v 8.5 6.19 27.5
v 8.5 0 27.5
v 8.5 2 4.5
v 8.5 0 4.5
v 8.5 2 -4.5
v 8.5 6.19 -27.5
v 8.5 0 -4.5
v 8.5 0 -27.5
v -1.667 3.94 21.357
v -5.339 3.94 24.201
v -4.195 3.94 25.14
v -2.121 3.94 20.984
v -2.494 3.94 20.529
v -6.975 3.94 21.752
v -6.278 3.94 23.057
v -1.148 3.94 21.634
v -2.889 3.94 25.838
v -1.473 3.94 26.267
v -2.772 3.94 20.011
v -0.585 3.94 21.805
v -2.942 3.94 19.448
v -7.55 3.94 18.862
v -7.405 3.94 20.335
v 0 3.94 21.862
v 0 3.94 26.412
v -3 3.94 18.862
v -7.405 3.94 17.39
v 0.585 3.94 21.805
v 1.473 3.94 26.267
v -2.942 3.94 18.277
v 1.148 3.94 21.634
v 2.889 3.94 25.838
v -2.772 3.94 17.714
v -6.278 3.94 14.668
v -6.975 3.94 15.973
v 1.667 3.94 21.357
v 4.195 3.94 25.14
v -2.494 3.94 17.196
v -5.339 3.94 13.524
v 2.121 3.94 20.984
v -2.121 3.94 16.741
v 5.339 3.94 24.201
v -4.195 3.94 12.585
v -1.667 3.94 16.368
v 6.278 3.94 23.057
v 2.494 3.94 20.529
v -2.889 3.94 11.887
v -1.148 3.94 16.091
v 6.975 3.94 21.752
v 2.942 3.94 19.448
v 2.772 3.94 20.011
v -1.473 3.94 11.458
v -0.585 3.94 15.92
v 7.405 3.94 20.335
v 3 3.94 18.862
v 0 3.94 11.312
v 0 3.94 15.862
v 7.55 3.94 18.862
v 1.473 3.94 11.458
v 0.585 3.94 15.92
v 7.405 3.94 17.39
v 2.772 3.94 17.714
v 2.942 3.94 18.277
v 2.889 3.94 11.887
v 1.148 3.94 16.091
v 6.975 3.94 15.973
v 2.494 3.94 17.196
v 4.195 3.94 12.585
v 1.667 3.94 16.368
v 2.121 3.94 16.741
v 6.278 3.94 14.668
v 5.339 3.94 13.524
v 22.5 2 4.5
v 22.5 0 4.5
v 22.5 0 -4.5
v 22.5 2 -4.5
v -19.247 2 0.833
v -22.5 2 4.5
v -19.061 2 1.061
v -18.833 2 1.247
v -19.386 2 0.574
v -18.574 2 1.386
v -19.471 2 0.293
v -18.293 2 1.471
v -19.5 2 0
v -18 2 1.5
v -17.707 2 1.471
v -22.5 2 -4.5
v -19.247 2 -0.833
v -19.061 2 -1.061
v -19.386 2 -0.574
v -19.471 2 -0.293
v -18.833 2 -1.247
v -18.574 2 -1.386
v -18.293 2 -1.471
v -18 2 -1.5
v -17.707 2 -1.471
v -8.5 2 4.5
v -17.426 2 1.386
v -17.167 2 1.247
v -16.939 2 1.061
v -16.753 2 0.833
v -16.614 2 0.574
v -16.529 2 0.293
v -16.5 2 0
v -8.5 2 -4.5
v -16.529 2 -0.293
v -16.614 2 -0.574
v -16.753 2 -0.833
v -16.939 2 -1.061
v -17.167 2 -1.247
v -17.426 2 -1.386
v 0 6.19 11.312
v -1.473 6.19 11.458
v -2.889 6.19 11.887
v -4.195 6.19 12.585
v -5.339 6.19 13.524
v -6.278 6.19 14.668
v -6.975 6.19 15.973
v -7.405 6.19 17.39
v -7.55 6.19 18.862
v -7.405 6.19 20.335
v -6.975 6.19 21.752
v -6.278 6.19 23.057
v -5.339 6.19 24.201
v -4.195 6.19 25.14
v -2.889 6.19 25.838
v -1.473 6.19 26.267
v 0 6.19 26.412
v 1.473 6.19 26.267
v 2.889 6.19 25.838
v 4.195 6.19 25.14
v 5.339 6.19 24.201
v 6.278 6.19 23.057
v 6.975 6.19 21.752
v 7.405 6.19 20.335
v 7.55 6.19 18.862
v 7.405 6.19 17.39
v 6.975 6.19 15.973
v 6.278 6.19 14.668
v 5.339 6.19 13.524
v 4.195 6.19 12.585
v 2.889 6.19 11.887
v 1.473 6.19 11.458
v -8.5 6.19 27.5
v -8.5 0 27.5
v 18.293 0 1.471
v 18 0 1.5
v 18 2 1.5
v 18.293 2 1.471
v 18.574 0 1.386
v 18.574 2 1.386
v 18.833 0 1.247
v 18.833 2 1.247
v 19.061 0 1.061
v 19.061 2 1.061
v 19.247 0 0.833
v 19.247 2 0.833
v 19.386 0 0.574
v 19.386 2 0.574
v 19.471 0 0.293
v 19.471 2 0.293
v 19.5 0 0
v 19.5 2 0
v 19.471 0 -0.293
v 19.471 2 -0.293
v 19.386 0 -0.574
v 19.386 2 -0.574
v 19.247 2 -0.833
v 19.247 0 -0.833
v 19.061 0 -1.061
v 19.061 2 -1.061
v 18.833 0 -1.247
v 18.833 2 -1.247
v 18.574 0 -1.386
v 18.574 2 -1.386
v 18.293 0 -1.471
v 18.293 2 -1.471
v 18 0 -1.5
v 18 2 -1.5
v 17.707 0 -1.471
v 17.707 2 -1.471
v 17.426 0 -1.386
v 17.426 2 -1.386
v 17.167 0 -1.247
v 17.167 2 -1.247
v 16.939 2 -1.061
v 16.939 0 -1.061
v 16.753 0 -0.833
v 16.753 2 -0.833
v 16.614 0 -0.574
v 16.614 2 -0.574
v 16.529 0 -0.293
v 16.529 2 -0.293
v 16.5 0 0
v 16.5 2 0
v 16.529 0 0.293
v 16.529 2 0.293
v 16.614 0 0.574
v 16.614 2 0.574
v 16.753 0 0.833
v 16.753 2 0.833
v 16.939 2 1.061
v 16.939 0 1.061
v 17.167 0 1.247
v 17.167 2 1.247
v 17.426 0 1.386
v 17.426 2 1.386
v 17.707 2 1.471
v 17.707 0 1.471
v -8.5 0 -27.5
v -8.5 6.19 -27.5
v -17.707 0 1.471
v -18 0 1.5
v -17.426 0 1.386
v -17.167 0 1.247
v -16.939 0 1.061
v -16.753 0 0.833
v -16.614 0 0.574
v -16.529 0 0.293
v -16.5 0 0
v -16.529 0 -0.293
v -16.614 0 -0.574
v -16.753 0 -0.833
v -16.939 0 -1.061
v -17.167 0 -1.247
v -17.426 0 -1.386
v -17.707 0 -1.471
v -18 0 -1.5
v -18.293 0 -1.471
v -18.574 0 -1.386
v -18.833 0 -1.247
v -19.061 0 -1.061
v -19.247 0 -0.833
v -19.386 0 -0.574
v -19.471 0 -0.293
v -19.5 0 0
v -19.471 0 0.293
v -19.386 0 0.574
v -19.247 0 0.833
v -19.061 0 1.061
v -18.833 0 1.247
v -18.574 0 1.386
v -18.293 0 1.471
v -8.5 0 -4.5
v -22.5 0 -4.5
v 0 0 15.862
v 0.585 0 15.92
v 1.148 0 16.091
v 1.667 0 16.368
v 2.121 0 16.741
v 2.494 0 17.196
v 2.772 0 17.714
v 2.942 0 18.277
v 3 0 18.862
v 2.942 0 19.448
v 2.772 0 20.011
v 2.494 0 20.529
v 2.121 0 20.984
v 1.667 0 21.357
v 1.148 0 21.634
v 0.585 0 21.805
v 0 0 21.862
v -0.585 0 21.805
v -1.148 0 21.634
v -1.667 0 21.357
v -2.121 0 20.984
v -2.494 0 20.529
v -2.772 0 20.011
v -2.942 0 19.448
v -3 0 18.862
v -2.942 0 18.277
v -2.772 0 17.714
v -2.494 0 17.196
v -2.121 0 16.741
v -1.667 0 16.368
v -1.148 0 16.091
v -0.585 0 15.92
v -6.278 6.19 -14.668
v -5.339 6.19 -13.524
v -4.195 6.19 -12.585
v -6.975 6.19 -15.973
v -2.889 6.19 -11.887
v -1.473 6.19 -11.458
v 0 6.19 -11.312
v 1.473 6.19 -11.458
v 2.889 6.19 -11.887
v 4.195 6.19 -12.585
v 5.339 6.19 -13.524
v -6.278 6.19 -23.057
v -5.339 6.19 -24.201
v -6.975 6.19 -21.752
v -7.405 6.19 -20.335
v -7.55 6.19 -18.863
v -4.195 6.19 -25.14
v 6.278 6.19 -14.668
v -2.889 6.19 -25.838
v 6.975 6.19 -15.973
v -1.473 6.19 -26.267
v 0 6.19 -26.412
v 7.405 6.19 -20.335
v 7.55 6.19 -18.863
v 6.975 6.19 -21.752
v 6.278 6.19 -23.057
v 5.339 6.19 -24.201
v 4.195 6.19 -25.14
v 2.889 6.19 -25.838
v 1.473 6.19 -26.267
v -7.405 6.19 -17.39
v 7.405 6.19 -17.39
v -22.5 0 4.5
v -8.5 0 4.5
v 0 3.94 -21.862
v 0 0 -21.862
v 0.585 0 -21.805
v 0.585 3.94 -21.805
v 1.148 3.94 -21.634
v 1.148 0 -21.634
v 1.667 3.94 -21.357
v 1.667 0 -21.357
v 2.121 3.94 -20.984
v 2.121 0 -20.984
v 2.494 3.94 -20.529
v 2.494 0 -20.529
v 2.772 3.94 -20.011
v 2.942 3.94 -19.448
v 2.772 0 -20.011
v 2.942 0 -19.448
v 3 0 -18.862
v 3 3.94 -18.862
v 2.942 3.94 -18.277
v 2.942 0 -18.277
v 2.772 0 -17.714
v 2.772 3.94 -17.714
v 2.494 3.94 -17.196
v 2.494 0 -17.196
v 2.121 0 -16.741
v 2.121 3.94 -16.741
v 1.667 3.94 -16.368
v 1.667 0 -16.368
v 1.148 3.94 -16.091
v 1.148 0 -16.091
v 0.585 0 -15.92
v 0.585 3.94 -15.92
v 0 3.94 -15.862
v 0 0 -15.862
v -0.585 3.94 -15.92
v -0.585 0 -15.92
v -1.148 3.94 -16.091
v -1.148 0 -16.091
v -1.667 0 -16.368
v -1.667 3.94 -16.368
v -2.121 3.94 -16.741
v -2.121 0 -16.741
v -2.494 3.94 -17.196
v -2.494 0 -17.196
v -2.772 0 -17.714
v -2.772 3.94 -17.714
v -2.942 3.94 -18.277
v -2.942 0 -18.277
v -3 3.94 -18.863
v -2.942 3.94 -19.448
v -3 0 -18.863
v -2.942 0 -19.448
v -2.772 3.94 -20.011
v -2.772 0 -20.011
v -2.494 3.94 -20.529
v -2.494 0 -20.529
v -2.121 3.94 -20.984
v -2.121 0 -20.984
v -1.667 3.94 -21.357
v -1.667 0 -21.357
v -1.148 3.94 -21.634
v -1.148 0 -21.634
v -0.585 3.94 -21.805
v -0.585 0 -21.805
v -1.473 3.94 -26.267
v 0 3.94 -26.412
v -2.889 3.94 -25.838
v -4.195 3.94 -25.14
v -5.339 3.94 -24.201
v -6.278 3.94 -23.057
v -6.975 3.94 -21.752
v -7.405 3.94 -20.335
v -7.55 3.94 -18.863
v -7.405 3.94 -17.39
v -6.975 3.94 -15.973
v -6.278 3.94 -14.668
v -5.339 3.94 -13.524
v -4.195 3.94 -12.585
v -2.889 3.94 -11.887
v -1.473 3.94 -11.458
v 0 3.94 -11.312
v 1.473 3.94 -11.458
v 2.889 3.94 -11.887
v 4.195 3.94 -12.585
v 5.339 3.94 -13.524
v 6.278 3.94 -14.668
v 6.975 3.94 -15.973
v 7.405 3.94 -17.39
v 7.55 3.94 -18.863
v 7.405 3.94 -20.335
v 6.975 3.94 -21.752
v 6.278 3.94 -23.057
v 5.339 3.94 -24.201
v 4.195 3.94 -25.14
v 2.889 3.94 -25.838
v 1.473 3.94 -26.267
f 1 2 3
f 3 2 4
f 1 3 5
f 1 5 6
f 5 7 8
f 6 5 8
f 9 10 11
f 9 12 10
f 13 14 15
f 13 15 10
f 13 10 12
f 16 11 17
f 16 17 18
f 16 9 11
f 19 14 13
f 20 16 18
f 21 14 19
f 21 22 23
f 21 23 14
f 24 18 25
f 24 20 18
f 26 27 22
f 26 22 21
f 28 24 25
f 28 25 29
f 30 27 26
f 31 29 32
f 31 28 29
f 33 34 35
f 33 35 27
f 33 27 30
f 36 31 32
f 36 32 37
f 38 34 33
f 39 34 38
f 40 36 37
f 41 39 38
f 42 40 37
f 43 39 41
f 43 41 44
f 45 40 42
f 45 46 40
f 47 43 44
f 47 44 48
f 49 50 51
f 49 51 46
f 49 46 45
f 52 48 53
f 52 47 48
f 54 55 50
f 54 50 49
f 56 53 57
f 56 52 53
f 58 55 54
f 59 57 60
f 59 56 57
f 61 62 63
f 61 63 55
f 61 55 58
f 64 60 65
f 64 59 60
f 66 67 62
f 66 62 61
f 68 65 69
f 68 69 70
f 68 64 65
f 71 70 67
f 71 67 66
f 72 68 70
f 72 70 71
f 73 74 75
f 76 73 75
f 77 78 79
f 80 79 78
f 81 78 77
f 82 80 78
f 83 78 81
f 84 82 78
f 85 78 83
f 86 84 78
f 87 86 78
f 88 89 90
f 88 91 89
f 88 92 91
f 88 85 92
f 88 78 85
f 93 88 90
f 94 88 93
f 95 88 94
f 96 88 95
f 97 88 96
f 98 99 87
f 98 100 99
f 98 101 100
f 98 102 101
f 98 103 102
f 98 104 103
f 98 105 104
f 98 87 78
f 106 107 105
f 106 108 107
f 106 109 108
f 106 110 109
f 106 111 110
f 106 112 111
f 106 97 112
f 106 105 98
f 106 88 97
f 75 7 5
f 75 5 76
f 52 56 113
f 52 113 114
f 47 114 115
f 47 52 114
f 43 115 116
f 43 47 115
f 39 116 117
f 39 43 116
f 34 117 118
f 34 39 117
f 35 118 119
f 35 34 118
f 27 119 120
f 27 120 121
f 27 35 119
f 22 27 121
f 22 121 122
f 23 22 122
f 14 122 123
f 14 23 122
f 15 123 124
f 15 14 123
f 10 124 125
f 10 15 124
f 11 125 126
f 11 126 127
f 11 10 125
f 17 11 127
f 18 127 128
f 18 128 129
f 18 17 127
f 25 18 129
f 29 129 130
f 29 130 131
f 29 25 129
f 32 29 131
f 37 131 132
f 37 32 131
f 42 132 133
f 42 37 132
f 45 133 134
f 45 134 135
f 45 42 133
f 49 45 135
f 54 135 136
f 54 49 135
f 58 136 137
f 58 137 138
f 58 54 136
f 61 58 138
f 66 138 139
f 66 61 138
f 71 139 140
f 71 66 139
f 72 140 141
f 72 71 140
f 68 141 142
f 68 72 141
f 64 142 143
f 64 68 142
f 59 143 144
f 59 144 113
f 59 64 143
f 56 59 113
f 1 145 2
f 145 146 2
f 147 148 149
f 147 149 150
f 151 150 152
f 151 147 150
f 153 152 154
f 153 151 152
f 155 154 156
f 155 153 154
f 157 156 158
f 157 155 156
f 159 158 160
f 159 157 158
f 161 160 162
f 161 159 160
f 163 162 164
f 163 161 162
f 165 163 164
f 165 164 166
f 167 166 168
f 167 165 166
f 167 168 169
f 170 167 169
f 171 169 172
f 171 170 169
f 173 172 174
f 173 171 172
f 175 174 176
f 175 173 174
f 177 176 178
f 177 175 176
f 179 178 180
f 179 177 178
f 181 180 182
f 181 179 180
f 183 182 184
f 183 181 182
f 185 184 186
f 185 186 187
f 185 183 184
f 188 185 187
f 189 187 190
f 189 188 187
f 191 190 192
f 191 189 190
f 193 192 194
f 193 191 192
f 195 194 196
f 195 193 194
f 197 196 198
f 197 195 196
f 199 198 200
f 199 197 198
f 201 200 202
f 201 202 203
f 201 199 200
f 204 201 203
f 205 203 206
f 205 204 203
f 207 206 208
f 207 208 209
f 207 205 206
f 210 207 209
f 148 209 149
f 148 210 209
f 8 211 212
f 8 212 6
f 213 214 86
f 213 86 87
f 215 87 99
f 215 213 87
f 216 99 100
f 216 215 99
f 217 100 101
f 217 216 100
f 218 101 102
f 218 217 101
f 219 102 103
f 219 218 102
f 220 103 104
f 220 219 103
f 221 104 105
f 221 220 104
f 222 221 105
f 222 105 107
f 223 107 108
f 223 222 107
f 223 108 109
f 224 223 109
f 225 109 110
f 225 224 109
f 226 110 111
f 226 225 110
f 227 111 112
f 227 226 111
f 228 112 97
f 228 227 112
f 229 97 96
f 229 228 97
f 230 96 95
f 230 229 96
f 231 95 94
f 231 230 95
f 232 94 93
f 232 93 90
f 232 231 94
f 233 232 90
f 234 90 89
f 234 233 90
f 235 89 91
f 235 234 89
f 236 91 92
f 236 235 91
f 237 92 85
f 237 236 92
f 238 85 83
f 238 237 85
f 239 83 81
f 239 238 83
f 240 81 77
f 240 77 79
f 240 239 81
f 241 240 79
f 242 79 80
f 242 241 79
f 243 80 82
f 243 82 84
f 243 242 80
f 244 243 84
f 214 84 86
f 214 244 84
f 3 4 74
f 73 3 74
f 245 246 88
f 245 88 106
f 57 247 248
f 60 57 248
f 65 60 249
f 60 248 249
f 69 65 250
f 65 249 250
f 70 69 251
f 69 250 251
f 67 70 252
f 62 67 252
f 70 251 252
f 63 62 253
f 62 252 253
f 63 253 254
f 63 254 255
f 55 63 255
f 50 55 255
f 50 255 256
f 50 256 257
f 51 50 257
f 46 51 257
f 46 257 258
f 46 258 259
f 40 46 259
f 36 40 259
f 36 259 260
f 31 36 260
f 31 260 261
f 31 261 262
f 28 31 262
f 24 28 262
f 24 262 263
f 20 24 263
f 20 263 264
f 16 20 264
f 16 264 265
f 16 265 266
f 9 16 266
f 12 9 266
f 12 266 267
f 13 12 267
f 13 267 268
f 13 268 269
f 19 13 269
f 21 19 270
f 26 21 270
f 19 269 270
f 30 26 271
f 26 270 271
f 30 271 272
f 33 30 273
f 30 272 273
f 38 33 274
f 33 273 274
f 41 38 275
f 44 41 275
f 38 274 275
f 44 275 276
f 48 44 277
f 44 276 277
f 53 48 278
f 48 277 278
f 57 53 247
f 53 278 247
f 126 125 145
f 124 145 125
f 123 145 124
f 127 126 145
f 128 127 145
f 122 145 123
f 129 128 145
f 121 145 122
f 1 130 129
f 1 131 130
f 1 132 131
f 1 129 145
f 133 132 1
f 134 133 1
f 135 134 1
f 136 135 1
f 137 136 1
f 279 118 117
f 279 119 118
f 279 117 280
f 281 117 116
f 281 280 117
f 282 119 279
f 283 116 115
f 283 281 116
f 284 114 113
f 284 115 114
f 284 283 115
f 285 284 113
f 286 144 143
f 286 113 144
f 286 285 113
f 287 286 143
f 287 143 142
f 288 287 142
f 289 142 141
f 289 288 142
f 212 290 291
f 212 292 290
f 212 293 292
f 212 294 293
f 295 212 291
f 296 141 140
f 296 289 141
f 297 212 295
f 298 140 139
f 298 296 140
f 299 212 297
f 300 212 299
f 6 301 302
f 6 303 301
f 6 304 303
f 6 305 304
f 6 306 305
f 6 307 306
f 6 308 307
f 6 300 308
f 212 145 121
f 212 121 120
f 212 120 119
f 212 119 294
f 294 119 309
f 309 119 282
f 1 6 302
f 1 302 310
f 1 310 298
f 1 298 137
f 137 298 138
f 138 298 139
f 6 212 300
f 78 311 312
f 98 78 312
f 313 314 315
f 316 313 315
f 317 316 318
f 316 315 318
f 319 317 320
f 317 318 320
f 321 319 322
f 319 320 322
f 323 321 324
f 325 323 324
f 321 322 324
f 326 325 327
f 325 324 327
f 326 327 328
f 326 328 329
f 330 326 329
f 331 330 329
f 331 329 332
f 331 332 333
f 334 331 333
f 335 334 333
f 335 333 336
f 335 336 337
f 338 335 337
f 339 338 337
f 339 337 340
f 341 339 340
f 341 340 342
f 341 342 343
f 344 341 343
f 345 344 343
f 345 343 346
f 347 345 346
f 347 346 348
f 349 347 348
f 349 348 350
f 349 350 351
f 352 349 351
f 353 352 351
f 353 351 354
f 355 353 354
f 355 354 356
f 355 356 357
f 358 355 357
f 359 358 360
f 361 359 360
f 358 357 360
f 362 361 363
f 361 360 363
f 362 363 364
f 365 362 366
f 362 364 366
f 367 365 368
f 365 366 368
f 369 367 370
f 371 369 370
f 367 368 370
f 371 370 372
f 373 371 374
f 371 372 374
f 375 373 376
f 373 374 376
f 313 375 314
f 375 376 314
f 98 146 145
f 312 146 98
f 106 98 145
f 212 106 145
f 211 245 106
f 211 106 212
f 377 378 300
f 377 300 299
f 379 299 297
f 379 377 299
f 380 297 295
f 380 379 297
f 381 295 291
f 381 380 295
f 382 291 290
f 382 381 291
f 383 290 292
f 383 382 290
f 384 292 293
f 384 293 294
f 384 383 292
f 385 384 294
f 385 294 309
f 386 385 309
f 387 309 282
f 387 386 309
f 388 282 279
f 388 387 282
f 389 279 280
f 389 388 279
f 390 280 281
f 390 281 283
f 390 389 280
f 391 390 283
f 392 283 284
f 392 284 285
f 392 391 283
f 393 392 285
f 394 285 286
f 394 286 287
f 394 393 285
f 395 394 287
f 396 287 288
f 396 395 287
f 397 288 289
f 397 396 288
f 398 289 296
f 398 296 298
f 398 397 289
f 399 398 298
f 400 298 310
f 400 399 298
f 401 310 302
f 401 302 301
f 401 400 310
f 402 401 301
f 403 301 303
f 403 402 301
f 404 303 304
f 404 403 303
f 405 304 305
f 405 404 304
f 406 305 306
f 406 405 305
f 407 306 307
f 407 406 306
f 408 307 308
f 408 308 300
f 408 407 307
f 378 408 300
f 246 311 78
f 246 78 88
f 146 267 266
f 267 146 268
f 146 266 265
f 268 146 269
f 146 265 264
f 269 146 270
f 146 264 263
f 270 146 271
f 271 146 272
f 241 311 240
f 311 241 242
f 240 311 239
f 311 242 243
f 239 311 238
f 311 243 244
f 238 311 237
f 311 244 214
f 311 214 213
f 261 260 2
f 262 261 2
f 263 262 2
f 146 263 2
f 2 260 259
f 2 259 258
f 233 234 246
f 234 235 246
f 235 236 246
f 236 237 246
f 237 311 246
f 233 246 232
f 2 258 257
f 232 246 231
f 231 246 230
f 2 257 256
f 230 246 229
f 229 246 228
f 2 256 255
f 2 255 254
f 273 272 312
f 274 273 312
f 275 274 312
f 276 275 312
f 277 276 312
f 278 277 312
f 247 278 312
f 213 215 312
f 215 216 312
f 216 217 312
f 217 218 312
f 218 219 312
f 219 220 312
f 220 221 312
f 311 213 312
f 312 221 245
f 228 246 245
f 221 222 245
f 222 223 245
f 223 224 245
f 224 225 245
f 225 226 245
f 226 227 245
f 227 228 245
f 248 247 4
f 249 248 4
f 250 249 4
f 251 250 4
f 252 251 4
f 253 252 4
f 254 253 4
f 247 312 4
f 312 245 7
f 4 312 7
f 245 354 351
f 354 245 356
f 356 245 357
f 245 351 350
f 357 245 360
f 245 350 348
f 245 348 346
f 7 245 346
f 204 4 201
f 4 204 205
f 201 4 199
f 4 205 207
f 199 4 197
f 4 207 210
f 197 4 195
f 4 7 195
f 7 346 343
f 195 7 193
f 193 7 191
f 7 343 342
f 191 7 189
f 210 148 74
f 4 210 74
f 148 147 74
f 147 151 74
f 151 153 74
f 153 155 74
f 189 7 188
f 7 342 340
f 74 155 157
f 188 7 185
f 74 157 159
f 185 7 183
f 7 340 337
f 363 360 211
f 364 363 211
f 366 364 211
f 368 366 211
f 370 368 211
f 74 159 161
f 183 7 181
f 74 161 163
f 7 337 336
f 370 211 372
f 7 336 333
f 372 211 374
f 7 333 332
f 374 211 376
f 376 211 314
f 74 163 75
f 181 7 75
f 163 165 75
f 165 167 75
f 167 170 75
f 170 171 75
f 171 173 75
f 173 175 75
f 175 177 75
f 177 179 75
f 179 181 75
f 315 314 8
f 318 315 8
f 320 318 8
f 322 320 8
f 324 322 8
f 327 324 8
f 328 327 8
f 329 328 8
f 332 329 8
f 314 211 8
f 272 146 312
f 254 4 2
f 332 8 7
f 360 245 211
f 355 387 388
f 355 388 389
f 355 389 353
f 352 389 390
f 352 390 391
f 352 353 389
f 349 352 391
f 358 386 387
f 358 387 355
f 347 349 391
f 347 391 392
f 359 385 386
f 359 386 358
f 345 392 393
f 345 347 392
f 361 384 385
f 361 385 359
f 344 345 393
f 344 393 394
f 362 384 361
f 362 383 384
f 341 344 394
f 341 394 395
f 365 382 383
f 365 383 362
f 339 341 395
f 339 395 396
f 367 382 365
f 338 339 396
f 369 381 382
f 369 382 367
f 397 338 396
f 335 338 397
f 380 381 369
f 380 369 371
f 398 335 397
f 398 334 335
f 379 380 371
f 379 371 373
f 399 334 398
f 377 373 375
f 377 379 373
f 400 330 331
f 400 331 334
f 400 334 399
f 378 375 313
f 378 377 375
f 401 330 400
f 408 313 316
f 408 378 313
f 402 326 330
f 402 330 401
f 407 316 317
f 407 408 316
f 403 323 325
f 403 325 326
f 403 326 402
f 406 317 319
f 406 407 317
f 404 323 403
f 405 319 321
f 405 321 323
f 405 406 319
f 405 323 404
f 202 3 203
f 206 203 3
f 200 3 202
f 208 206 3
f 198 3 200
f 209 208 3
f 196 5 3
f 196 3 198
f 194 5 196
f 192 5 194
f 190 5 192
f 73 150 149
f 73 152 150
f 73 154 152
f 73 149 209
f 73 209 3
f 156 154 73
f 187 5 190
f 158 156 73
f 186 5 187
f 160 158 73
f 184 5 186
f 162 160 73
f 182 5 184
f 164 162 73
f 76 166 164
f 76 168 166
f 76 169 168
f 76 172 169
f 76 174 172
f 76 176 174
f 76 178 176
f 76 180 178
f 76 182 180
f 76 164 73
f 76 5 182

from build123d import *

# Parameters (mm, degrees)
SKETCH1_W           = 17
SKETCH1_H           = 55
SKETCH1_R           = 7.55
SKETCH1_W_2         = 14
SKETCH1_H_2         = 9
SKETCH1_R_2         = 1.5
BOSS_EXTRUDE1_DEPTH = 2
BOSS_EXTRUDE2_START = 2
SKETCH1_4_W         = 17
SKETCH1_4_H         = 55
SKETCH1_4_R         = 7.55
BOSS_EXTRUDE2_DEPTH = 1.94
BOSS_EXTRUDE3_START = 3.94
SKETCH1_5_W         = 17
SKETCH1_5_H         = 55
SKETCH1_5_R         = 7.55
BOSS_EXTRUDE3_DEPTH = 2.25
SKETCH3_R           = 3
CUT_EXTRUDE1_DEPTH  = 37.06682825


with BuildPart() as part:
    # Sketch1 → Boss-Extrude1 (new body)
    # profile 1 of 5: a face of its own
    with BuildSketch(Plane(origin=(0, 0, 0), x_dir=(1, 0, 0), z_dir=(0, 1, 0))):
        Rectangle(SKETCH1_W, SKETCH1_H)
        with Locations((0, -18.8625)):
            Circle(SKETCH1_R, mode=Mode.SUBTRACT)
        with Locations((0, 18.8625)):
            Circle(SKETCH1_R, mode=Mode.SUBTRACT)
    # profile 2 of 5: a face of its own
    with BuildSketch(Plane(origin=(0, 0, 0), x_dir=(1, 0, 0), z_dir=(0, 1, 0))):
        with Locations((15.5, 0)):
            Rectangle(SKETCH1_W_2, SKETCH1_H_2)
        with Locations(Location((18, 0, 0), (0, 0, 270))):
            Circle(SKETCH1_R_2, mode=Mode.SUBTRACT)
    # profile 3 of 5: a face of its own
    with BuildSketch(Plane(origin=(0, 0, 0), x_dir=(1, 0, 0), z_dir=(0, 1, 0))):
        with Locations((-15.5, 0)):
            Rectangle(SKETCH1_W_2, SKETCH1_H_2)
        with Locations(Location((-18, 0, 0), (0, 0, 270))):
            Circle(SKETCH1_R_2, mode=Mode.SUBTRACT)
    # profile 4 of 5: a face of its own
    with BuildSketch(Plane(origin=(0, 0, 0), x_dir=(1, 0, 0), z_dir=(0, 1, 0))):
        with Locations((0, -18.8625)):
            Circle(SKETCH1_R)
    # profile 5 of 5: a face of its own
    with BuildSketch(Plane(origin=(0, 0, 0), x_dir=(1, 0, 0), z_dir=(0, 1, 0))):
        with Locations((0, 18.8625)):
            Circle(SKETCH1_R)
    extrude(amount=BOSS_EXTRUDE1_DEPTH)

    # Sketch1<4> → Boss-Extrude2 (add)
    # profile 1 of 3: a face of its own
    with BuildSketch(Plane(origin=(0, 0, 0), x_dir=(1, 0, 0), z_dir=(0, 1, 0)).offset(BOSS_EXTRUDE2_START)):
        Rectangle(SKETCH1_4_W, SKETCH1_4_H)
        with Locations((0, -18.8625)):
            Circle(SKETCH1_4_R, mode=Mode.SUBTRACT)
        with Locations((0, 18.8625)):
            Circle(SKETCH1_4_R, mode=Mode.SUBTRACT)
    # profile 2 of 3: a face of its own
    with BuildSketch(Plane(origin=(0, 0, 0), x_dir=(1, 0, 0), z_dir=(0, 1, 0)).offset(BOSS_EXTRUDE2_START)):
        with Locations((0, -18.8625)):
            Circle(SKETCH1_4_R)
    # profile 3 of 3: a face of its own
    with BuildSketch(Plane(origin=(0, 0, 0), x_dir=(1, 0, 0), z_dir=(0, 1, 0)).offset(BOSS_EXTRUDE2_START)):
        with Locations((0, 18.8625)):
            Circle(SKETCH1_4_R)
    extrude(amount=BOSS_EXTRUDE2_DEPTH)

    # Sketch1<5> → Boss-Extrude3 (add)
    with BuildSketch(Plane(origin=(0, 0, 0), x_dir=(1, 0, 0), z_dir=(0, 1, 0)).offset(BOSS_EXTRUDE3_START)):
        Rectangle(SKETCH1_5_W, SKETCH1_5_H)
        with Locations(Location((0, -18.8625, 0), (0, 0, 90))):
            Circle(SKETCH1_5_R, mode=Mode.SUBTRACT)
        with Locations(Location((0, 18.8625, 0), (0, 0, 90))):
            Circle(SKETCH1_5_R, mode=Mode.SUBTRACT)
    extrude(amount=BOSS_EXTRUDE3_DEPTH)

    # Sketch3 → Cut-Extrude1 (cut, through all)
    with BuildSketch(Plane.XZ):
        with Locations(Location((0, -18.8625, 0), (0, 0, 270))):
            Circle(SKETCH3_R)
        with Locations(Location((0, 18.8625, 0), (0, 0, 270))):
            Circle(SKETCH3_R)
    extrude(amount=-CUT_EXTRUDE1_DEPTH, mode=Mode.SUBTRACT)


solid = part.part
